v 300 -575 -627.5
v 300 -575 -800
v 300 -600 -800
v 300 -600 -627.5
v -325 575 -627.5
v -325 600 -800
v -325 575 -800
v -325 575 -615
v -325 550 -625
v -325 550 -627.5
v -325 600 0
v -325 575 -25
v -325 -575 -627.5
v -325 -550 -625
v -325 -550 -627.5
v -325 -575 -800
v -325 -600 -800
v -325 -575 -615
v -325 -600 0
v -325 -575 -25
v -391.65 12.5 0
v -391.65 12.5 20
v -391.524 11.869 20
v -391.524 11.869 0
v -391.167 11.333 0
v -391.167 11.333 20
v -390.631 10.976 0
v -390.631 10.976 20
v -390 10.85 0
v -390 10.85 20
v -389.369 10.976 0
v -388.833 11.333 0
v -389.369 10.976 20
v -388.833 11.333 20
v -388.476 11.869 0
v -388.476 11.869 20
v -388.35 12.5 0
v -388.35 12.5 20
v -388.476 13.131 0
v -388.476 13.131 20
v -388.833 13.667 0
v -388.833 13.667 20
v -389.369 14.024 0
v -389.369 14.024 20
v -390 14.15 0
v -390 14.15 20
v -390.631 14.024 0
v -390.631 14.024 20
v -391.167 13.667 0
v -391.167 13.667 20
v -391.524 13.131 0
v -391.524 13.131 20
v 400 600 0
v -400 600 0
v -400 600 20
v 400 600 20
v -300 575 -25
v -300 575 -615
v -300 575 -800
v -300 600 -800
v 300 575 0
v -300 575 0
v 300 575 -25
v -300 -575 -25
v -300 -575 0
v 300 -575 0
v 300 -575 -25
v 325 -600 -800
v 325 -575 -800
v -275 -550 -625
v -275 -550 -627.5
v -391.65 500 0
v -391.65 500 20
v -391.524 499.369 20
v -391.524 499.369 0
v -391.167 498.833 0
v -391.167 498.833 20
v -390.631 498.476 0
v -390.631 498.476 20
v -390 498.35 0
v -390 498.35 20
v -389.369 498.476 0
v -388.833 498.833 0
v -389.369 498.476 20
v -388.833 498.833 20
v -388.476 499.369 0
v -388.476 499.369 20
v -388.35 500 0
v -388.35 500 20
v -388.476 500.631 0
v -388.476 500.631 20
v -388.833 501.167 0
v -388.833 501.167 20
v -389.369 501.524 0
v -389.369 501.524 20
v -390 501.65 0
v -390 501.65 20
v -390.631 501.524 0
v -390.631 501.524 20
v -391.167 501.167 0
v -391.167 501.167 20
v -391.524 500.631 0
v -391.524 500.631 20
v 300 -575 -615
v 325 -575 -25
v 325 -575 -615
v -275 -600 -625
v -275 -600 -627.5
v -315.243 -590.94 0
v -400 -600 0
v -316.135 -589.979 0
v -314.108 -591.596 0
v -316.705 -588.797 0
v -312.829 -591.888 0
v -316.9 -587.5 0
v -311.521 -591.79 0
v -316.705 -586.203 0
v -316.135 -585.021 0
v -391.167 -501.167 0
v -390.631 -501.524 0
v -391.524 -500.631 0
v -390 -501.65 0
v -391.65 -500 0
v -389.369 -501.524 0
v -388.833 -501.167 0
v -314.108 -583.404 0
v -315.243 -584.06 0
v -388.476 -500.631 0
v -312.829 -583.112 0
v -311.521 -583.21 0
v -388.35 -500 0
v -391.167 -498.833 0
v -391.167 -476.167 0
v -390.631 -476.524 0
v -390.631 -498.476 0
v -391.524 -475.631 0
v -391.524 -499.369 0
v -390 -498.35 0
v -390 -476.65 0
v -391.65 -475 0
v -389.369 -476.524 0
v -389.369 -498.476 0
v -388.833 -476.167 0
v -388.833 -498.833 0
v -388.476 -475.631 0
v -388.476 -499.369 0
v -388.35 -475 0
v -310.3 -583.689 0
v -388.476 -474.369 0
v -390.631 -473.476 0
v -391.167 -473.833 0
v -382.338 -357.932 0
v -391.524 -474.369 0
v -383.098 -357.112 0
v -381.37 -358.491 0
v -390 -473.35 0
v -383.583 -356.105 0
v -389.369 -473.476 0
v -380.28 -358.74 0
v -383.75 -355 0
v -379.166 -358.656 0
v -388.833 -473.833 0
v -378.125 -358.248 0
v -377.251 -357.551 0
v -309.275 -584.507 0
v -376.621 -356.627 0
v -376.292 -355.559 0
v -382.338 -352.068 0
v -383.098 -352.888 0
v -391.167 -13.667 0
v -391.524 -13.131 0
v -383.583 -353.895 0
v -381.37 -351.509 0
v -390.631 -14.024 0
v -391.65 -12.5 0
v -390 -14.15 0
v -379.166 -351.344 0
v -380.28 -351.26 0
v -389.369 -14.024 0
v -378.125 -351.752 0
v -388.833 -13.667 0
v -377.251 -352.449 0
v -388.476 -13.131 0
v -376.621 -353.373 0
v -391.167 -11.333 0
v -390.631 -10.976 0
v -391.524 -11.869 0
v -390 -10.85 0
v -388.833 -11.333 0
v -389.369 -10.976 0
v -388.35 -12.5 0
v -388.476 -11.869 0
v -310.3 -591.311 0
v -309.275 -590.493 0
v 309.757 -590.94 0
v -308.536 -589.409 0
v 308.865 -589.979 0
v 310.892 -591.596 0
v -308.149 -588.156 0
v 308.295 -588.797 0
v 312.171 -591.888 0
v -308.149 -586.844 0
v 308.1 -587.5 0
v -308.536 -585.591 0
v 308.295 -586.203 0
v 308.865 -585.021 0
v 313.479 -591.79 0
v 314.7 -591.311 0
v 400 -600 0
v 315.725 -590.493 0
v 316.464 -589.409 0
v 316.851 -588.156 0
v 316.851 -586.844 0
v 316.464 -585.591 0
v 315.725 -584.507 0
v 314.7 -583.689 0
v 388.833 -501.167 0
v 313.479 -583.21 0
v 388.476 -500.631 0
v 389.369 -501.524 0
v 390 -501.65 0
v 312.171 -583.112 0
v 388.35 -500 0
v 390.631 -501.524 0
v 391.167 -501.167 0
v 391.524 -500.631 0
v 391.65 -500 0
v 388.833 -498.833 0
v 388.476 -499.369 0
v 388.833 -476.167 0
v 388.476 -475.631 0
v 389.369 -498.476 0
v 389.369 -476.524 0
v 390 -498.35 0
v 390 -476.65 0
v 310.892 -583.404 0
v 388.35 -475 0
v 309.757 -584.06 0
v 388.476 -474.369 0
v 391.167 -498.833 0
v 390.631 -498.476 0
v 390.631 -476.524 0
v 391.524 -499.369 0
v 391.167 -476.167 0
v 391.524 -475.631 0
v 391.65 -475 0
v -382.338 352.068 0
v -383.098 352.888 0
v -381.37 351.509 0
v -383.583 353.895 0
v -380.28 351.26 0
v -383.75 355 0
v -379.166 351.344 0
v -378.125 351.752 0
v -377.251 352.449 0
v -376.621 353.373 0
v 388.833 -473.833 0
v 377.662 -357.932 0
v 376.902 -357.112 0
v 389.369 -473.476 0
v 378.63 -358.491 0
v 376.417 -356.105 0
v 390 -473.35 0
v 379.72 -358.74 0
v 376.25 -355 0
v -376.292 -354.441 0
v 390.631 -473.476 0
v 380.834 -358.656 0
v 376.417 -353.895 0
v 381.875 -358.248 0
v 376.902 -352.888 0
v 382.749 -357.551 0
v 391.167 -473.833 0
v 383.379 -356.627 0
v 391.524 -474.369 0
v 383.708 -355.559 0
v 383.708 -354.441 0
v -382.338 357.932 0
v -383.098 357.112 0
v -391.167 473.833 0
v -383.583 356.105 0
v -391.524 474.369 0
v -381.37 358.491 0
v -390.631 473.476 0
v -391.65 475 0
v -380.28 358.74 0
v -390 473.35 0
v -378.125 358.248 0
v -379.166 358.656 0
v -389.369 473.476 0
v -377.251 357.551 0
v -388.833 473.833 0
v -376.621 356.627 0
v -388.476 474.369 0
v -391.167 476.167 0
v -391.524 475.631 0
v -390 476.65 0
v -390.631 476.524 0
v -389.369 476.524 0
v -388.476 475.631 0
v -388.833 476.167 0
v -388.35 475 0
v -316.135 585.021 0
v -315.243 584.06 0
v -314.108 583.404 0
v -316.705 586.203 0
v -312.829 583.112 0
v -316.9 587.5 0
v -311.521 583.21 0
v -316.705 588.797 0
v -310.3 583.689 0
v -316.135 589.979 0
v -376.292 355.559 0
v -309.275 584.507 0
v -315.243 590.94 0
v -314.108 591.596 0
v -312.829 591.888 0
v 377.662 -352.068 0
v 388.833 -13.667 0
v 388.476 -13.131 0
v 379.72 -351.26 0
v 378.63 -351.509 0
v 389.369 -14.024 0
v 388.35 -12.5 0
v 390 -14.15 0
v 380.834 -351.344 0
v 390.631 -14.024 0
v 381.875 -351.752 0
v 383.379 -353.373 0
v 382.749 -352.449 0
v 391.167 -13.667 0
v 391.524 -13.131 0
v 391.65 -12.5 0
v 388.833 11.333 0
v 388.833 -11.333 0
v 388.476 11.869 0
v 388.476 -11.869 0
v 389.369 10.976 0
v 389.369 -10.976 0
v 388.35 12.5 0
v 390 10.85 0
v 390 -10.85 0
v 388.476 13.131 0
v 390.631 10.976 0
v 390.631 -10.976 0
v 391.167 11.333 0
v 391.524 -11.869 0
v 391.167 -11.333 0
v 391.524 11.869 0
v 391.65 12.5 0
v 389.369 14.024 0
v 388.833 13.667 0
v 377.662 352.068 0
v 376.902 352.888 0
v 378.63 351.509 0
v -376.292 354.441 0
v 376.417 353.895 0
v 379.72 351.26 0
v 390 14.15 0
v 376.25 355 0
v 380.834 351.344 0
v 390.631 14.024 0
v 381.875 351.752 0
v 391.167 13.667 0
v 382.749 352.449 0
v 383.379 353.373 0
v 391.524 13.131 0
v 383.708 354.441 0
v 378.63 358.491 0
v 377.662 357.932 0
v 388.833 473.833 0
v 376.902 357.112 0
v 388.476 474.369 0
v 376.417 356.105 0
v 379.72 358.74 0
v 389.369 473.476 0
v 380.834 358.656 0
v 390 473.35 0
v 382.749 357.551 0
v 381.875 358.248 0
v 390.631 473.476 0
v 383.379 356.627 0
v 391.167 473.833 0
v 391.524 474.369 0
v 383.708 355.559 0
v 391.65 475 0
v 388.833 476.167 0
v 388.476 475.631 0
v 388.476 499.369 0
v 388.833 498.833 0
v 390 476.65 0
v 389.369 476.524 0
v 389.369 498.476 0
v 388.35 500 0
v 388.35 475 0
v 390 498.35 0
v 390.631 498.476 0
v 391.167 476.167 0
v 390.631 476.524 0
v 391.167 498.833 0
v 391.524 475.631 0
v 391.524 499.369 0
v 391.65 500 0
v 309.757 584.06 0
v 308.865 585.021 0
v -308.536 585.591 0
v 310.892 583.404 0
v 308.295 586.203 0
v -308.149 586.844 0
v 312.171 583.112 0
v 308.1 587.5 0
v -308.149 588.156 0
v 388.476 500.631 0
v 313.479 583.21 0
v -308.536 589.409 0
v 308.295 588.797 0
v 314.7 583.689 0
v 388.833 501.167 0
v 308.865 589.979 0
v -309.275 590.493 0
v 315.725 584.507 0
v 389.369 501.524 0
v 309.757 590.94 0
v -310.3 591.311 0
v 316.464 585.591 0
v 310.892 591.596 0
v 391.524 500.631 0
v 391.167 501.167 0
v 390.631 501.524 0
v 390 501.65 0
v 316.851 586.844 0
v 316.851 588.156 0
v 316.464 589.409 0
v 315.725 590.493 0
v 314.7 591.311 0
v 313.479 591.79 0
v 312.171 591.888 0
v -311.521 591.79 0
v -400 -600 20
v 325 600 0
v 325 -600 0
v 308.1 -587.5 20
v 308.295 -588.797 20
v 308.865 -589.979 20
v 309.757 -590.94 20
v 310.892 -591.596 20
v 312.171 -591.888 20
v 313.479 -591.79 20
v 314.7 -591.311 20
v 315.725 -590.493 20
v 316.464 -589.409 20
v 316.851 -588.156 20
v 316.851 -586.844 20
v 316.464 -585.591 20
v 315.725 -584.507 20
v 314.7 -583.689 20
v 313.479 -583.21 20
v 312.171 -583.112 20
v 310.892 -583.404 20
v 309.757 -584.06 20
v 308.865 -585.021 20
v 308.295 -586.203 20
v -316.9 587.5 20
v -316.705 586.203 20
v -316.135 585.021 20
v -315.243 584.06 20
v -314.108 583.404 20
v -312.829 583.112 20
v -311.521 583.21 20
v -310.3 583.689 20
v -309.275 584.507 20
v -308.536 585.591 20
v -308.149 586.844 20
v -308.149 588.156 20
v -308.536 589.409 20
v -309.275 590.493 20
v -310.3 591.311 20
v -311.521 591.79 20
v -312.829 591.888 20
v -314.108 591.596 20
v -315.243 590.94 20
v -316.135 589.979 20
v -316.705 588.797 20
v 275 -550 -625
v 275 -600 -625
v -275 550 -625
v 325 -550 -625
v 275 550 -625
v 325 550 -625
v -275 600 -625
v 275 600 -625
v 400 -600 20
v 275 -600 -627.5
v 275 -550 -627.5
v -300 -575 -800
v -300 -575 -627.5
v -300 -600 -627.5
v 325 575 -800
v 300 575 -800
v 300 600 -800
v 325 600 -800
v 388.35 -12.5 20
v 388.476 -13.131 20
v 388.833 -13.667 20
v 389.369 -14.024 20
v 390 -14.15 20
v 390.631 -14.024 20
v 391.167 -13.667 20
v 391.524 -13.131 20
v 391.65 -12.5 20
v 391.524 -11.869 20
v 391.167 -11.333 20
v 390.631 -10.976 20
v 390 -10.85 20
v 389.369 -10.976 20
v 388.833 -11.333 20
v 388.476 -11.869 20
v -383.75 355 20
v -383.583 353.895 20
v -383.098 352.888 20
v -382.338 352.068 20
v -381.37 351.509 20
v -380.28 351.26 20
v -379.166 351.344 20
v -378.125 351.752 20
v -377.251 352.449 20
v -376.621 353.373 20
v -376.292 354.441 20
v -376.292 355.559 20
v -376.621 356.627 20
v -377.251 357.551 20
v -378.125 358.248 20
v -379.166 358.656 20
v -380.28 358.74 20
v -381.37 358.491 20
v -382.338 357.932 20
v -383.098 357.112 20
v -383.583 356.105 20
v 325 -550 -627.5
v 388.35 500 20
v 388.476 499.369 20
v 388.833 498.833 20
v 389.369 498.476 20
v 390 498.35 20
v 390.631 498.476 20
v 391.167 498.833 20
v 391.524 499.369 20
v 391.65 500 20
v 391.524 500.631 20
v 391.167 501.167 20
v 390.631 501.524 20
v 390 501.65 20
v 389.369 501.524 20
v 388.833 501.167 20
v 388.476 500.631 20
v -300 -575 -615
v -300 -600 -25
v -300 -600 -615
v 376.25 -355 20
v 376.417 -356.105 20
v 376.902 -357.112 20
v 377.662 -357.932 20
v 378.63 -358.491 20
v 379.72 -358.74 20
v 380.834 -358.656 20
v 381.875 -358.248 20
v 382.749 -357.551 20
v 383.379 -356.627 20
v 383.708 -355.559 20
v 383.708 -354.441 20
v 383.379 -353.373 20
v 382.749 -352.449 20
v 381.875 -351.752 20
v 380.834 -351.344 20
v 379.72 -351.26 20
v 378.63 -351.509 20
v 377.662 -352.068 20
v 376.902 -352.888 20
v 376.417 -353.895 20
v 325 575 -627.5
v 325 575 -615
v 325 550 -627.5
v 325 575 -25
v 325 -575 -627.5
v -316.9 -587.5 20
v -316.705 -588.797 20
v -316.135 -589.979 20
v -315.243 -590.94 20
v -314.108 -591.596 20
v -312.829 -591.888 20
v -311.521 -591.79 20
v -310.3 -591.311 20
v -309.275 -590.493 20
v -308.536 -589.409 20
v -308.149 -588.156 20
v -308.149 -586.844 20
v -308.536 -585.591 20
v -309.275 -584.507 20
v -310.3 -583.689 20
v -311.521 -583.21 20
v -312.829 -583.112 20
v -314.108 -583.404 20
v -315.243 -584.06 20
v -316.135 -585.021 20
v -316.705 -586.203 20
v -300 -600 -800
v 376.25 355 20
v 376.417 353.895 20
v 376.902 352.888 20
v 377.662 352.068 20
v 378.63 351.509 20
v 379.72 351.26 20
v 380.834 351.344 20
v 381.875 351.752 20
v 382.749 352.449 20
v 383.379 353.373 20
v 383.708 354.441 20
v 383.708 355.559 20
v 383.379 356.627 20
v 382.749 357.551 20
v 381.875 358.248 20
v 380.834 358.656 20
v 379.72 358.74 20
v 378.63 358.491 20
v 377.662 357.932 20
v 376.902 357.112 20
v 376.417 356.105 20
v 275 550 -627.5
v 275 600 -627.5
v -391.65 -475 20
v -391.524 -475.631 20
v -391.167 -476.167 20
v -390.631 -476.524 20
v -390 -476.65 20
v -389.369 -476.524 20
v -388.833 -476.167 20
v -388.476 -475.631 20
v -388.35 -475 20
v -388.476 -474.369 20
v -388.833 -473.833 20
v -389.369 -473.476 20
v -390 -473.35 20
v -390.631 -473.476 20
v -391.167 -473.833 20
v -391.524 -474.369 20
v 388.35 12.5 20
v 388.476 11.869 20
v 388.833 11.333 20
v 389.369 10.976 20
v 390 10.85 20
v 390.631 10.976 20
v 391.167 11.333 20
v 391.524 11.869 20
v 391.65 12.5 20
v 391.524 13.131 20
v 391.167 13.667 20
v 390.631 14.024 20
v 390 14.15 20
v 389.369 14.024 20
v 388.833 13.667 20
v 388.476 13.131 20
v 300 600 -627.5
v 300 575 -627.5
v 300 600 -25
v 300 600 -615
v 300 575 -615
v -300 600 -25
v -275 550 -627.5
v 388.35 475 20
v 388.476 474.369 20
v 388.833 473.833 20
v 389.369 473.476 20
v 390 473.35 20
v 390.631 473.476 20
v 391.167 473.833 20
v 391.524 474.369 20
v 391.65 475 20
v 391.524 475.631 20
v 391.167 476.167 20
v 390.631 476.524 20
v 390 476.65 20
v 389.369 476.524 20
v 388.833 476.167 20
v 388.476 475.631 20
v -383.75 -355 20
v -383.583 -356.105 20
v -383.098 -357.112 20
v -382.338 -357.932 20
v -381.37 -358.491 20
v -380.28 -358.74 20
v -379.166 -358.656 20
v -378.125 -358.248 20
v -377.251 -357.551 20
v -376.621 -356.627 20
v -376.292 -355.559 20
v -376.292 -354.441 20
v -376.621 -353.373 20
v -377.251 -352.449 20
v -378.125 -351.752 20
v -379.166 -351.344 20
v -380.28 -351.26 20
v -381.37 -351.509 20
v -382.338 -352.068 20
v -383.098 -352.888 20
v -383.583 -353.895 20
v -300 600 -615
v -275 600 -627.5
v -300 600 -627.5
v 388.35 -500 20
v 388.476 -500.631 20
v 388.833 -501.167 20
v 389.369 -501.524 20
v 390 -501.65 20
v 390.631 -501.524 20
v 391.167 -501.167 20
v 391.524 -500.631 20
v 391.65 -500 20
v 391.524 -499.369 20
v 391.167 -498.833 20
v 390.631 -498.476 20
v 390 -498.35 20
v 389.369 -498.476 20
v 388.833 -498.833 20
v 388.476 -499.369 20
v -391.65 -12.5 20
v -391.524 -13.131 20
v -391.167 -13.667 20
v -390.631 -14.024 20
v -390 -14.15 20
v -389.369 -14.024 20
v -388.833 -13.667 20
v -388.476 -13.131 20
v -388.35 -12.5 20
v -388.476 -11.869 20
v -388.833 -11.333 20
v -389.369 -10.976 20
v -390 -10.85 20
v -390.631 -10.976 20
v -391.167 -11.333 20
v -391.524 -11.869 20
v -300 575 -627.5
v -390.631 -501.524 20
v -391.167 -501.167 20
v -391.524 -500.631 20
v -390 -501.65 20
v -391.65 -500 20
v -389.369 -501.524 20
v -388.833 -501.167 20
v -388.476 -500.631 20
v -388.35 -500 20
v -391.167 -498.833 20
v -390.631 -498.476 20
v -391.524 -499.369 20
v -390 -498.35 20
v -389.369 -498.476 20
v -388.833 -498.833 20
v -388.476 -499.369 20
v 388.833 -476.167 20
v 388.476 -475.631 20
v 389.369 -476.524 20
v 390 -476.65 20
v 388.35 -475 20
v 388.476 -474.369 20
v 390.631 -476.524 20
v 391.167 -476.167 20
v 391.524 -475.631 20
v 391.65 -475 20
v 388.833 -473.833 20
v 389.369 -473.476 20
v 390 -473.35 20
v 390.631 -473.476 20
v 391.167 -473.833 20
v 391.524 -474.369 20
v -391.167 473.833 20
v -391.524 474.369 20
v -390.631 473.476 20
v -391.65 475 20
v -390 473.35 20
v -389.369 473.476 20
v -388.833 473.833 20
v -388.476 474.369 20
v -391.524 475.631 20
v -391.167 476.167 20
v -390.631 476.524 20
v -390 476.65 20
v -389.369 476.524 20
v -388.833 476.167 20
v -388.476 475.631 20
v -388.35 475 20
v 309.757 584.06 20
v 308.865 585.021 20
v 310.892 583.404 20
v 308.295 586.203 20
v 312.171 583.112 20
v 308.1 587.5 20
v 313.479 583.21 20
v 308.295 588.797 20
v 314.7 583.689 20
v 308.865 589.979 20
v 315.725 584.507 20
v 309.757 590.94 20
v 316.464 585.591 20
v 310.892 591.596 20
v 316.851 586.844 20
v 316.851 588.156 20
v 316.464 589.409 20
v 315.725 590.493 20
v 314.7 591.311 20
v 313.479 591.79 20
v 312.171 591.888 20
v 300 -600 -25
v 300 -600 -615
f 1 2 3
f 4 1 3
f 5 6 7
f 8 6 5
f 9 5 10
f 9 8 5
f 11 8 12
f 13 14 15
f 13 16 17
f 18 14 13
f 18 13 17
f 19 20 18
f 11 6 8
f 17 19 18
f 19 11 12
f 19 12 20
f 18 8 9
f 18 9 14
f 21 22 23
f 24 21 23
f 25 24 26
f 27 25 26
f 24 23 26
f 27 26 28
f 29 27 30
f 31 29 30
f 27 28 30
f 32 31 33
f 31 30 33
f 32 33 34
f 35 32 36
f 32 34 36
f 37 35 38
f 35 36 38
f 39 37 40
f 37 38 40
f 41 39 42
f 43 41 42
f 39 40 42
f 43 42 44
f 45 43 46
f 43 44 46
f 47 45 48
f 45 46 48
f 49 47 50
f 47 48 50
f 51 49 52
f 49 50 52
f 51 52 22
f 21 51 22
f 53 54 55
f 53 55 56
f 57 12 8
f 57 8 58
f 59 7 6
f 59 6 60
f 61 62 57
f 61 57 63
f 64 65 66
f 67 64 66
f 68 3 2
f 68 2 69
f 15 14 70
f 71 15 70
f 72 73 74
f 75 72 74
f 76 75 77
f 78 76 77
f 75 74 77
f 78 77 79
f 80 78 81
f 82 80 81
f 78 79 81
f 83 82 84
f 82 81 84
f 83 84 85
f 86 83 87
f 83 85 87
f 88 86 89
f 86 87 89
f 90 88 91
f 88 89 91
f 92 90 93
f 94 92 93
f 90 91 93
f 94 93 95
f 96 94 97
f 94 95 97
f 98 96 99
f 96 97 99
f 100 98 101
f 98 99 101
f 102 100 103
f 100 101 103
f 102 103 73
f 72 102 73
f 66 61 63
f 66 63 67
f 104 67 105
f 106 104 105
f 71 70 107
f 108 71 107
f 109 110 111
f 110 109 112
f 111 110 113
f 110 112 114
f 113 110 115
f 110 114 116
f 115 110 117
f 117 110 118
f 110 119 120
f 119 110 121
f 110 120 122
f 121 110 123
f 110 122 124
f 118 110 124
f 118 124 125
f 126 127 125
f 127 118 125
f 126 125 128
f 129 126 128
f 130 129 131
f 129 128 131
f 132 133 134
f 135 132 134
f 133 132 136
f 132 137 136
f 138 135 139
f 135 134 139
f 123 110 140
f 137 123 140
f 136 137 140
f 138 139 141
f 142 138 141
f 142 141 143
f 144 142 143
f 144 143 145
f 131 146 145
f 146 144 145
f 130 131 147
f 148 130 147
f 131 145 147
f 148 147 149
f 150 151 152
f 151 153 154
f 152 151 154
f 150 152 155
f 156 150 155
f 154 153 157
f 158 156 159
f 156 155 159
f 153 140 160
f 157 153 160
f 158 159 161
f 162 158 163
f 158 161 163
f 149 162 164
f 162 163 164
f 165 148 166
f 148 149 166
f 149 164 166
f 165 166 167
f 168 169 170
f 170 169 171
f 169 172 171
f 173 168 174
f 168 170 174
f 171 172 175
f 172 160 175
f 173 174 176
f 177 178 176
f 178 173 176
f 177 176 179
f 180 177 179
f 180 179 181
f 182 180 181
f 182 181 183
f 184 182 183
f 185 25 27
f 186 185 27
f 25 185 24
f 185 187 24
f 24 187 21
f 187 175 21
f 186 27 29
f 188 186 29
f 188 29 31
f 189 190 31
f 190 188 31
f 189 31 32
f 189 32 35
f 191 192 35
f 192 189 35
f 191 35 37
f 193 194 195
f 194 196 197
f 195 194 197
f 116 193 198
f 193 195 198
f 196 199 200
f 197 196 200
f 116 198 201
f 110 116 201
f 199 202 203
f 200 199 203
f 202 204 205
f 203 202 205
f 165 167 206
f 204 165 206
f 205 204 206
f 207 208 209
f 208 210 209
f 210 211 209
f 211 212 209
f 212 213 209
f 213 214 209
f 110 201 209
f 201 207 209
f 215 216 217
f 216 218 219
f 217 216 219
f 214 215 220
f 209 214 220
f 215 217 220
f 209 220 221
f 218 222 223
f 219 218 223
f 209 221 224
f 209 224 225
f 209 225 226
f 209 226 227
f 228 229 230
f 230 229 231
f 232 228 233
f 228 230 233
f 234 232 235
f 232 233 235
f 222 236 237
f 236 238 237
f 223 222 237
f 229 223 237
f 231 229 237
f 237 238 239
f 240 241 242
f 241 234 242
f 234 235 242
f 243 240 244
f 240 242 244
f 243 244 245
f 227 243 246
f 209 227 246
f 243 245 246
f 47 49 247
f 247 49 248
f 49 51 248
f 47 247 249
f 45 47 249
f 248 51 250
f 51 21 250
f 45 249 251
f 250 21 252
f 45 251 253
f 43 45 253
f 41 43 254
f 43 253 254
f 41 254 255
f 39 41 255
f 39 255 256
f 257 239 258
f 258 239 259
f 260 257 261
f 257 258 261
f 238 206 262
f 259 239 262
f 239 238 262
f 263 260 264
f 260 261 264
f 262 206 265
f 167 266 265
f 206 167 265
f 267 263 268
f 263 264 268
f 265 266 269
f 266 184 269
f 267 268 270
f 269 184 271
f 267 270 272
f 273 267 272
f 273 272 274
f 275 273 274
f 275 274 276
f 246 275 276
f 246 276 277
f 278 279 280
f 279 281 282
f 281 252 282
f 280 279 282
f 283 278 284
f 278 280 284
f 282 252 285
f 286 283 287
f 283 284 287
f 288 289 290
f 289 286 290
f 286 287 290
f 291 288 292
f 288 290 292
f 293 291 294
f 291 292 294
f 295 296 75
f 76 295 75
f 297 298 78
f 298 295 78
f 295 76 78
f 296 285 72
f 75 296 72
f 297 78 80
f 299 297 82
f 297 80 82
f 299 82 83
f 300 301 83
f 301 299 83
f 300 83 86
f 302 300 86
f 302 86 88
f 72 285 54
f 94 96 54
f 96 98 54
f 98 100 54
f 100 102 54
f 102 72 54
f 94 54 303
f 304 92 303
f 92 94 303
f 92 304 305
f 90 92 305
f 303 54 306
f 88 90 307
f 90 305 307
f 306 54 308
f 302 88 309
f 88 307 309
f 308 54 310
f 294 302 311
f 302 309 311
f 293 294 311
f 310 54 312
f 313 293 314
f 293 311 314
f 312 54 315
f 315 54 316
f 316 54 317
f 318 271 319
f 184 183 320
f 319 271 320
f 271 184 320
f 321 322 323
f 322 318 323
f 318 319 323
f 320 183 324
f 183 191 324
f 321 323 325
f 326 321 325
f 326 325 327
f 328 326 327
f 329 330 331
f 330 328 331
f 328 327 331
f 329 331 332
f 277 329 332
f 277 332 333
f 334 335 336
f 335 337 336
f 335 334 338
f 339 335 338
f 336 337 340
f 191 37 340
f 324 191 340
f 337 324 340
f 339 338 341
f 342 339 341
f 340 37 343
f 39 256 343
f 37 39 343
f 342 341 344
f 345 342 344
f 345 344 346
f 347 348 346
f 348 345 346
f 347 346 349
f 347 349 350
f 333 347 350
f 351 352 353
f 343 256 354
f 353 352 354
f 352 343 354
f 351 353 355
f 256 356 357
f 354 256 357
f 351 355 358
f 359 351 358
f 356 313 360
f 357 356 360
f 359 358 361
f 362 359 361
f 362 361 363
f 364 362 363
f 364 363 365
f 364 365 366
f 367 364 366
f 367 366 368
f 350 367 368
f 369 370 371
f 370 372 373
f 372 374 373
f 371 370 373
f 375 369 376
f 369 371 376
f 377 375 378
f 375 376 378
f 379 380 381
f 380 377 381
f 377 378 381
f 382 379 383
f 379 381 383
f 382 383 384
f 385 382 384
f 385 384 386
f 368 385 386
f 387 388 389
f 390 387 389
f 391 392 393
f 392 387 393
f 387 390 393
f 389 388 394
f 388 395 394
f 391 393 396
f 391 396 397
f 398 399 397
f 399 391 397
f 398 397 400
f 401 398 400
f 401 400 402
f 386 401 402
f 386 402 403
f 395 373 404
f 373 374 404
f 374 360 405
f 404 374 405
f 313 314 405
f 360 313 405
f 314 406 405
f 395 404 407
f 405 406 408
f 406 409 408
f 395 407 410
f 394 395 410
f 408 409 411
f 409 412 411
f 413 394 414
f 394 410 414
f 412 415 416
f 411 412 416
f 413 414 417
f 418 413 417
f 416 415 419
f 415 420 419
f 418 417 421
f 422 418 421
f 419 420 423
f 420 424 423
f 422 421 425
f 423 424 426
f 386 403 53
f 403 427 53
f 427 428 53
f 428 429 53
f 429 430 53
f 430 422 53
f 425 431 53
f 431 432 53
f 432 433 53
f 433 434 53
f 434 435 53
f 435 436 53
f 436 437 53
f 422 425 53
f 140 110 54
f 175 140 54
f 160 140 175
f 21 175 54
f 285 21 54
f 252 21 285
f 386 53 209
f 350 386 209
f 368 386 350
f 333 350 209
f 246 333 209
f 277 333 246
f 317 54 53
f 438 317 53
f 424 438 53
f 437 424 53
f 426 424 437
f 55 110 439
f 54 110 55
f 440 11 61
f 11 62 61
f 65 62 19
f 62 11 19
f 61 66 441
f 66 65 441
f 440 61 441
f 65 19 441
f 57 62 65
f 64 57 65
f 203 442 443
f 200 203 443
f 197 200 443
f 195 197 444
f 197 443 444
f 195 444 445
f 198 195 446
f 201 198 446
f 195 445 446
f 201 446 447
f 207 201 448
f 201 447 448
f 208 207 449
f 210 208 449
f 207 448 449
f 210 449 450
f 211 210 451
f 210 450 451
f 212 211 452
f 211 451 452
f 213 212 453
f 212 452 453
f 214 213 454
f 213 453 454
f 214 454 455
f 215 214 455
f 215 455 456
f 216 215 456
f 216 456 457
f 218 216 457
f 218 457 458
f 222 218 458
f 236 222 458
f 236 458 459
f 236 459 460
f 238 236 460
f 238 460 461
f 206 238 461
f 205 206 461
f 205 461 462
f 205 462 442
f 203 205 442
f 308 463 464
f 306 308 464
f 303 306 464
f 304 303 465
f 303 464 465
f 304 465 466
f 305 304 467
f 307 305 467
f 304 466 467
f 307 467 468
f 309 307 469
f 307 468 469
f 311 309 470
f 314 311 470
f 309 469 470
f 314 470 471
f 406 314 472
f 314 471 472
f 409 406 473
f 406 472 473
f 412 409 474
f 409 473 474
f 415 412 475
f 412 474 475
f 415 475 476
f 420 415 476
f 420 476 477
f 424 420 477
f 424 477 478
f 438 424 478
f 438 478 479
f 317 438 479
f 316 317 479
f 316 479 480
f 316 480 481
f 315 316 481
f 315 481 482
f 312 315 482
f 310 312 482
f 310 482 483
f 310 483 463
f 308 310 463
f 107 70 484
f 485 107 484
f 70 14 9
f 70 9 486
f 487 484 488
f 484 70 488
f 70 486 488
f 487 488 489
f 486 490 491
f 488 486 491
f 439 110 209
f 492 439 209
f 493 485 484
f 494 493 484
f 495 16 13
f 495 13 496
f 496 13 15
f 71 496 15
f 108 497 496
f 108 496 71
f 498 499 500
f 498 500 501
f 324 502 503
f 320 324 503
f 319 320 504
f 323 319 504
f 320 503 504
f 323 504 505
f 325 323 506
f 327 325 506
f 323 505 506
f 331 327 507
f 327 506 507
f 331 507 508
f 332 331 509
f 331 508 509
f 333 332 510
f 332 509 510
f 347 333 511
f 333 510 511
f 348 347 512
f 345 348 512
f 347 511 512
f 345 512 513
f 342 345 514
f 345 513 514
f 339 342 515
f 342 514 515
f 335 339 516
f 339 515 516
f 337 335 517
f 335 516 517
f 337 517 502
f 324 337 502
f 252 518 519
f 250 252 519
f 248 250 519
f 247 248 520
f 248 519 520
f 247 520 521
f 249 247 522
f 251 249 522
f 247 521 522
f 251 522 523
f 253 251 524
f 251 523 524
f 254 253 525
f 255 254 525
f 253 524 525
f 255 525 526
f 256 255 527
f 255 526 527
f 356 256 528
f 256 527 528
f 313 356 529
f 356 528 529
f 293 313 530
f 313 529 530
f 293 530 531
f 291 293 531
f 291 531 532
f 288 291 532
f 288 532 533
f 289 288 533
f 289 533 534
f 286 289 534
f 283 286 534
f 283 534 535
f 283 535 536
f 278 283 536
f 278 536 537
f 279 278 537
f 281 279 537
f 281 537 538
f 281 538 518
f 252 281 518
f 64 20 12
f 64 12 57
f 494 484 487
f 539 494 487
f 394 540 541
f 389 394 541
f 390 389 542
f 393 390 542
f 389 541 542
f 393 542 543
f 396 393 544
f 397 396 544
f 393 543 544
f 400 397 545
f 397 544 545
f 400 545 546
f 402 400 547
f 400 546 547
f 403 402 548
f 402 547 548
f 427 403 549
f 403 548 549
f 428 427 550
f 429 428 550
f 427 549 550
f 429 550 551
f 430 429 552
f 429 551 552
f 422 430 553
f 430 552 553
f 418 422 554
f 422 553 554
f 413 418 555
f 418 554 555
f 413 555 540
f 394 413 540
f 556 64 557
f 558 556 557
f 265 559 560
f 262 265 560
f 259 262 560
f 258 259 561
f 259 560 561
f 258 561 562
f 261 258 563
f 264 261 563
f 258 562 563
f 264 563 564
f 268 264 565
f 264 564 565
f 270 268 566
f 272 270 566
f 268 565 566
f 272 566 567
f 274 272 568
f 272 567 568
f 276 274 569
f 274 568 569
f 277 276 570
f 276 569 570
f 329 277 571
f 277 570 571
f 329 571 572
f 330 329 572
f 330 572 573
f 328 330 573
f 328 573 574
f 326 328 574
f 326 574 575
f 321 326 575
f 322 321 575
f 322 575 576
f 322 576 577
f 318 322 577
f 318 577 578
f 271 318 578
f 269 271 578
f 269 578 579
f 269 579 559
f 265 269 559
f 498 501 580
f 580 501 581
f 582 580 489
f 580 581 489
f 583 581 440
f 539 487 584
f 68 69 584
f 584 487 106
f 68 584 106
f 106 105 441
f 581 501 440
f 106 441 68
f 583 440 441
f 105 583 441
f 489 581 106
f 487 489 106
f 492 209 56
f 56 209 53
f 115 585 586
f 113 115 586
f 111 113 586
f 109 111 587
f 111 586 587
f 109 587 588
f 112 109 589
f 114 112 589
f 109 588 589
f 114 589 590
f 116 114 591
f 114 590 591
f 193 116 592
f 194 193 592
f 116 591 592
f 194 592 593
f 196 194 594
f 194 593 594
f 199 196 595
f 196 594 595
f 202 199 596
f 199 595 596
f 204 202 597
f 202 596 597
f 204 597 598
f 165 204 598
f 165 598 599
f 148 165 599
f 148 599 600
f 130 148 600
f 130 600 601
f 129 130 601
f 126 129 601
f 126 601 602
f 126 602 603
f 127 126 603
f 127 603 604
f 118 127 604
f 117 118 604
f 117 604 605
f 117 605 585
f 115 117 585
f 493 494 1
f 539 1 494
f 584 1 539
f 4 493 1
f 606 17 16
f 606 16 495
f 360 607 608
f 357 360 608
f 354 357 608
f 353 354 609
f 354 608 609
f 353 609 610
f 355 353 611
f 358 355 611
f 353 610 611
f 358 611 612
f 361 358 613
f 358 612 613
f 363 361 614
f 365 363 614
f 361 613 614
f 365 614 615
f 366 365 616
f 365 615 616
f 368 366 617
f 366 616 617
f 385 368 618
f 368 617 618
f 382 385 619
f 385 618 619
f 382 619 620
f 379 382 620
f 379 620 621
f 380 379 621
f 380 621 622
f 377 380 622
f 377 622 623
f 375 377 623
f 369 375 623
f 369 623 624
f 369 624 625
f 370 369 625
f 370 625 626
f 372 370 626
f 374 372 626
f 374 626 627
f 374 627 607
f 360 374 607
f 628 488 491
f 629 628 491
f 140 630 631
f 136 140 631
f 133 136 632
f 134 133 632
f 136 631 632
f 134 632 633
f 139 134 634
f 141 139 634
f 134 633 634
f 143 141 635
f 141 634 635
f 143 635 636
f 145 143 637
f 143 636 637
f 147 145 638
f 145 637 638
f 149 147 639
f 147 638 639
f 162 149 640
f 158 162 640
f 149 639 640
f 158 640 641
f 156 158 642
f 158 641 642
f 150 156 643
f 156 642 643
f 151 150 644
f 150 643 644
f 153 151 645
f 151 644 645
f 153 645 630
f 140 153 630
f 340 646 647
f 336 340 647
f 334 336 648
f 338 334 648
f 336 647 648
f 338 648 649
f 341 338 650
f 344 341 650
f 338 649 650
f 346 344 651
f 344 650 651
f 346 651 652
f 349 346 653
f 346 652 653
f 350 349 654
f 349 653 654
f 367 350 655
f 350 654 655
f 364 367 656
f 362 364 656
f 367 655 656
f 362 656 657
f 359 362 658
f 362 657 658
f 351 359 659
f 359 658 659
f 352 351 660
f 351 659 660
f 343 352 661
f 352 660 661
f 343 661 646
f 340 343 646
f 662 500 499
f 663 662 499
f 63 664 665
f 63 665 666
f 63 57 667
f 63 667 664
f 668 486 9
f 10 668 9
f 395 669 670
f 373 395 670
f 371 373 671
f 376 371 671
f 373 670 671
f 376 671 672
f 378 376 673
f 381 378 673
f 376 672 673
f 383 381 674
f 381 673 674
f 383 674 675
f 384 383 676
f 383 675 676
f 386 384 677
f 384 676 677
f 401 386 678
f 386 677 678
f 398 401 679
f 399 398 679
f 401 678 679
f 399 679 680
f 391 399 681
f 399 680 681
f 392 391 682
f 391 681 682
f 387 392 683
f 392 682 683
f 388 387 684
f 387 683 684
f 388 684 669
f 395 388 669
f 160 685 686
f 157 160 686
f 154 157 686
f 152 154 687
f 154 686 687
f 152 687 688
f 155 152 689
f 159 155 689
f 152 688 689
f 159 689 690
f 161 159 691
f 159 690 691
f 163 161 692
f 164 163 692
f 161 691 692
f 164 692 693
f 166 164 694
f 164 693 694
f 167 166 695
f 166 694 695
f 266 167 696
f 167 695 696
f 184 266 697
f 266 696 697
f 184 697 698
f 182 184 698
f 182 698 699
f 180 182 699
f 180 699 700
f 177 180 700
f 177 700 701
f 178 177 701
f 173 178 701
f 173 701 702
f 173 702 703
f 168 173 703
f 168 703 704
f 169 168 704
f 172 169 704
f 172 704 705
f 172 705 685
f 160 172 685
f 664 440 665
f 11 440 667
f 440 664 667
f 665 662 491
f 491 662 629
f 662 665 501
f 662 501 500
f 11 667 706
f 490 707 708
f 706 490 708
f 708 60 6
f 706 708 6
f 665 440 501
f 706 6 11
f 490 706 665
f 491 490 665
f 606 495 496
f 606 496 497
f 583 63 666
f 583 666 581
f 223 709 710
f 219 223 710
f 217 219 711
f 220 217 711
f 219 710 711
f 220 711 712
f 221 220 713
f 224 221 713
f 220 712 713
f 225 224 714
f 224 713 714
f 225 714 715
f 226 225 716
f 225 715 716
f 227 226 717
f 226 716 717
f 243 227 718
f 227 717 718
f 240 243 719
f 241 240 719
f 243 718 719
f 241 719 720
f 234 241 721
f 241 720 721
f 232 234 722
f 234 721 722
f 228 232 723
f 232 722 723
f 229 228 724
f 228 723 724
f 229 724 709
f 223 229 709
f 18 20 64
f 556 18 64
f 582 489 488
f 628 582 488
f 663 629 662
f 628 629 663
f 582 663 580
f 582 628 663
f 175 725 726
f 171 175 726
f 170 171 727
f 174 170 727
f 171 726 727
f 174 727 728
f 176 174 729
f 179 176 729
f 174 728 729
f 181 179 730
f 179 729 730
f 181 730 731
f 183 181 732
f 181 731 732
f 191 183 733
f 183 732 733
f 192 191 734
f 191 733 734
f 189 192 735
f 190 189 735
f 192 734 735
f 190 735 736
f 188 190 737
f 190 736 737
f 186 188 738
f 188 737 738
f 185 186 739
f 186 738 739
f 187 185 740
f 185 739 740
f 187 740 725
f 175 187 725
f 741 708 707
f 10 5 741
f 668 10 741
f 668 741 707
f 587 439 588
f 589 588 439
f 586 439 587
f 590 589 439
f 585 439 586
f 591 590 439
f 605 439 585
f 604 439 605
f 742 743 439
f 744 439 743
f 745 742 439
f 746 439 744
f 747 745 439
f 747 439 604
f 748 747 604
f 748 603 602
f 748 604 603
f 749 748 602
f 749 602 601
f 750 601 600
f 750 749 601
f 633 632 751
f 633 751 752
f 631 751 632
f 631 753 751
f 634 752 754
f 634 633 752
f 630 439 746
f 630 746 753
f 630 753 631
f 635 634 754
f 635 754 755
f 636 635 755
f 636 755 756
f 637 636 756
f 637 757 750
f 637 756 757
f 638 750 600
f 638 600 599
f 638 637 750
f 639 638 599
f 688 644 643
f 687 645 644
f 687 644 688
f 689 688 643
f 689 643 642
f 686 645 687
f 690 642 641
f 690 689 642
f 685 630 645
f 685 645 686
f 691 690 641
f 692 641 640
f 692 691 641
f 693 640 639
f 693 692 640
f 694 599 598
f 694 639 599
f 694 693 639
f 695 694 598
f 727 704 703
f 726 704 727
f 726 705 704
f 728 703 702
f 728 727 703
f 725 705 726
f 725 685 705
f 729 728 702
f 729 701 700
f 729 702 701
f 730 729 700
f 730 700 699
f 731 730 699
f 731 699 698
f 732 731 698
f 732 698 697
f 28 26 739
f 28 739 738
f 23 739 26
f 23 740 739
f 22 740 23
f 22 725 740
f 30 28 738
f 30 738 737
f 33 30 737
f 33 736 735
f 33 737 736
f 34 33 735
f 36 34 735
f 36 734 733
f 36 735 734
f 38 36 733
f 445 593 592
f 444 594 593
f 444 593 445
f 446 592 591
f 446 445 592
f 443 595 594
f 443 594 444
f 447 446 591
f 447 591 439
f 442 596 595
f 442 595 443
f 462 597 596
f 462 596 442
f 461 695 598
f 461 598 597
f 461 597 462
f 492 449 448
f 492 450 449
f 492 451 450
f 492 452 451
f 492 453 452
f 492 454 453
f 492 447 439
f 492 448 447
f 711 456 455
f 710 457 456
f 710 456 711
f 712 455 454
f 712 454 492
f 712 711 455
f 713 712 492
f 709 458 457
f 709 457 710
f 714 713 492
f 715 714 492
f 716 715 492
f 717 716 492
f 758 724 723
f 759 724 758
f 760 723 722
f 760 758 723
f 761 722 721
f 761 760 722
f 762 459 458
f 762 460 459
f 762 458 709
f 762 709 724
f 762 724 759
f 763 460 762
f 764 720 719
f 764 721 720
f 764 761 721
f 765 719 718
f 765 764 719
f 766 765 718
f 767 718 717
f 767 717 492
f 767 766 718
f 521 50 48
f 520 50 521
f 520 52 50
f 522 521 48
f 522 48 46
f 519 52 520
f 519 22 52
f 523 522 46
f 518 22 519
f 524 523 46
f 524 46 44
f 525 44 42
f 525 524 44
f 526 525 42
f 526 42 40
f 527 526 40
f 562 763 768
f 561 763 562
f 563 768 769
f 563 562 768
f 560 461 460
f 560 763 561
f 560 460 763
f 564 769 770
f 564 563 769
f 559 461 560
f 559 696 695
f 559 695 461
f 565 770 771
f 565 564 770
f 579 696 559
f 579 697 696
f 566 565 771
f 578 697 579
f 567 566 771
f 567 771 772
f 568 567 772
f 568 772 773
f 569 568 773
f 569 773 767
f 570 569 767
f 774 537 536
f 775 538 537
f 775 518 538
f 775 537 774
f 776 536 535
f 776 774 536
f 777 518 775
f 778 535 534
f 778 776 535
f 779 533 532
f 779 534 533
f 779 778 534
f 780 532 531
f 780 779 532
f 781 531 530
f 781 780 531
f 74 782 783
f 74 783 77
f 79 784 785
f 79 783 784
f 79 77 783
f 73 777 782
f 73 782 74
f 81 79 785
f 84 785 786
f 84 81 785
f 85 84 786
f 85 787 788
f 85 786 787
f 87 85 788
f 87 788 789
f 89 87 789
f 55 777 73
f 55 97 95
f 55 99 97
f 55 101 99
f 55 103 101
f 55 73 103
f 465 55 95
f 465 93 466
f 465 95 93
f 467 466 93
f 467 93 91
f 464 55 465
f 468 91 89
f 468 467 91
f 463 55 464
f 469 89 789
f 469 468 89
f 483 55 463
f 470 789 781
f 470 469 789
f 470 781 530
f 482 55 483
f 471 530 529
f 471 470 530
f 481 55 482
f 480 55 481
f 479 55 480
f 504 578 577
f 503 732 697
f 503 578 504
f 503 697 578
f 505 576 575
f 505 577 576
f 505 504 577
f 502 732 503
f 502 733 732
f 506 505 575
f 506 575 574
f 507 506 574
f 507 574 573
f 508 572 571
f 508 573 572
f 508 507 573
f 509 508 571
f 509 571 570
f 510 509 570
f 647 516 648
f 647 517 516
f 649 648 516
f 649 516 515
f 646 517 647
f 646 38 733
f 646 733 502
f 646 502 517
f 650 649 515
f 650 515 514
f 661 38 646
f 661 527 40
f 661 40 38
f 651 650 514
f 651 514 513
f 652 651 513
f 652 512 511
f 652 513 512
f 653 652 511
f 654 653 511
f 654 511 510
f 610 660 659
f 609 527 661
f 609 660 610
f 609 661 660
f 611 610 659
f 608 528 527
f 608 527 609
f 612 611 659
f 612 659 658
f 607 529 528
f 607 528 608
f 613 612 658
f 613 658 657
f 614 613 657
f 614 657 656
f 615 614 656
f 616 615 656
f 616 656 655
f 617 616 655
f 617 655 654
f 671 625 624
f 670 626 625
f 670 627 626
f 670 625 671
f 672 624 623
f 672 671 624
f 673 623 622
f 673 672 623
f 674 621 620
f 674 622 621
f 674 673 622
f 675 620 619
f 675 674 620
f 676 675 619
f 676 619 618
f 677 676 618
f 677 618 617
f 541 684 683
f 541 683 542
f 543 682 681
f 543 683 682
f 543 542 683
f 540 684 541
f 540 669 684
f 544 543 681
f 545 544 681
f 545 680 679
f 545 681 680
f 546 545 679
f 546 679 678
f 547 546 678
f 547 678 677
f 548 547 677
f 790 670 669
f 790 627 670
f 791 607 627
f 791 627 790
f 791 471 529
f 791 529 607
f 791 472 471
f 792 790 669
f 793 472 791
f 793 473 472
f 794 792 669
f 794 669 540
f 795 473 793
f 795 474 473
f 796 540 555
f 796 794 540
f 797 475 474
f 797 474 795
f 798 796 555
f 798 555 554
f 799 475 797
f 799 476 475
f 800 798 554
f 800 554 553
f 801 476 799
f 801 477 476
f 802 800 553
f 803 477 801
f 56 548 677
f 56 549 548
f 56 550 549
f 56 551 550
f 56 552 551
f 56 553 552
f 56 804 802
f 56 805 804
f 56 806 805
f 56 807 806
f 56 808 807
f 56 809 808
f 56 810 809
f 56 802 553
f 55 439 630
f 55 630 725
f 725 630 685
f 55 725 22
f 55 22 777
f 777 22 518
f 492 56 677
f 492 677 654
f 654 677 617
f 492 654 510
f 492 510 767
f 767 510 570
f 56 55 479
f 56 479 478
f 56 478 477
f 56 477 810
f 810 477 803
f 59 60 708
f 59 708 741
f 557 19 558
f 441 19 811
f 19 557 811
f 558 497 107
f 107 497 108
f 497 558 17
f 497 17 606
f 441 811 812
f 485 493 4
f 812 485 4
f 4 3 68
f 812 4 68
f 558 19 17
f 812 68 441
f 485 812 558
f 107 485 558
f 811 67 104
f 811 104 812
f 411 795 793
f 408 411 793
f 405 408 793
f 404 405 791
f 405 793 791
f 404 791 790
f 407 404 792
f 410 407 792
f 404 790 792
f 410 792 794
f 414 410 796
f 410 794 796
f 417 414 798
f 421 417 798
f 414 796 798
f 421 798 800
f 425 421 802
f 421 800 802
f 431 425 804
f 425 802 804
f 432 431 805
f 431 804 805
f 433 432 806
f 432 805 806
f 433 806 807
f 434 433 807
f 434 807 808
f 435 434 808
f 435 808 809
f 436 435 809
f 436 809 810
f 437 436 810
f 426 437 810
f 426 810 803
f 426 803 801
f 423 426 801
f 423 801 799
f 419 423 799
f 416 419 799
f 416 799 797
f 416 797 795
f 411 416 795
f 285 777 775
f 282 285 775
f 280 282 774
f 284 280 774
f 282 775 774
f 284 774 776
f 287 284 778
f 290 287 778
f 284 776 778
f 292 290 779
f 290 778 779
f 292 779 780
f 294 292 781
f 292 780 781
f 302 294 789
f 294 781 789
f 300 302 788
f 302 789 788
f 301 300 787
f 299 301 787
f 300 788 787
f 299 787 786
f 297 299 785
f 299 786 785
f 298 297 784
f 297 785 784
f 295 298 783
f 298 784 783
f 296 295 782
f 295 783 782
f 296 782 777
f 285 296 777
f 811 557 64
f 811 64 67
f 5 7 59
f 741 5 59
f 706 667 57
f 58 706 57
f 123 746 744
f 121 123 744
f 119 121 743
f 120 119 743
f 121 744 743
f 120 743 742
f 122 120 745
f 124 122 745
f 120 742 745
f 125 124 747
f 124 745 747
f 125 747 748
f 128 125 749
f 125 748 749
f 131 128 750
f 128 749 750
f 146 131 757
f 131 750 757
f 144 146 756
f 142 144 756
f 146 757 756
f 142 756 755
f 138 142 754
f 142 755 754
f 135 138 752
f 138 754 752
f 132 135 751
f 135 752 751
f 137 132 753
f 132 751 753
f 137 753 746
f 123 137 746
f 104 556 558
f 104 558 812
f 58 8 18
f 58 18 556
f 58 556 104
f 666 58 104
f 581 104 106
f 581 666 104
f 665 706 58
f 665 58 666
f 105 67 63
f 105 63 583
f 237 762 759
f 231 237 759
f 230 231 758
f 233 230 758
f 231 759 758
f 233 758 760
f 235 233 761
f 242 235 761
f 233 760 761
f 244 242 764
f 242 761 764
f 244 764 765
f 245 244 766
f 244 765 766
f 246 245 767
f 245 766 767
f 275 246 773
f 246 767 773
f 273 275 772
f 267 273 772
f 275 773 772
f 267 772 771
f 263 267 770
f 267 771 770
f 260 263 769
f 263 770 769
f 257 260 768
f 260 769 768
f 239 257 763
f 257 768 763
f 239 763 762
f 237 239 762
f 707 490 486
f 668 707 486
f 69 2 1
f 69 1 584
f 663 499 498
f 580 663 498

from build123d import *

# Parameters (mm, degrees)
F0_W      = 800
F0_H      = 1200
F1_DEPTH  = 20
F2_W      = 25
F2_H      = 25
F3_DEPTH  = 800
F4_W      = 600
F4_H      = 25
F5_DEPTH  = 25
F4_W_2    = 25
F4_H_2    = 1150
F7_D      = 3.3
F9_D      = 7.5
F10_D     = 8.8
F14_DEPTH = 2.5
F16_DEPTH = 10


with BuildPart() as f1:
    # F0 (on Top) → F1 (new body)
    with BuildSketch(Plane.XY):
        Rectangle(F0_W, F0_H)
    extrude(amount=F1_DEPTH)

    # F7 (through all)
    with Locations(Plane(origin=(0, 0, 0), x_dir=(1, 0, 0), z_dir=(0, 0, -1))):
        with Locations((390, 500), (390, 475), (390, 12.5), (390, -12.5), (390, -500), (390, -475), (-390, -500), (-390, -475), (-390, -12.5), (-390, 12.5), (-390, 475), (-390, 500)):
            Hole(F7_D / 2)

    # F9 (through all)
    with Locations(Plane(origin=(0, 0, 0), x_dir=(1, 0, 0), z_dir=(0, 0, -1))):
        with Locations((380, 355), (380, -355), (-380, -355), (-380, 355)):
            Hole(F9_D / 2)

    # F10 (through all)
    with Locations(Plane(origin=(0, 0, 0), x_dir=(1, 0, 0), z_dir=(0, 0, -1))):
        with Locations((-312.5, 587.5), (312.5, 587.5), (312.5, -587.5), (-312.5, -587.5)):
            Hole(F10_D / 2)


with BuildPart() as f3:
    # F2 (on face) → F3 (new body)
    with BuildSketch(Plane(origin=(0, 0, 0), x_dir=(1, 0, 0), z_dir=(0, 0, -1))):
        with Locations((-312.5, 587.5)):
            Rectangle(F2_W, F2_H)
    extrude(amount=F3_DEPTH)


with BuildPart() as f3b:
    # F2 (on face) → F3, piece 2 (new body)
    with BuildSketch(Plane(origin=(0, 0, 0), x_dir=(1, 0, 0), z_dir=(0, 0, -1))):
        with Locations((312.5, 587.5)):
            Rectangle(F2_W, F2_H)
    extrude(amount=F3_DEPTH)


with BuildPart() as f3c:
    # F2 (on face) → F3, piece 3 (new body)
    with BuildSketch(Plane(origin=(0, 0, 0), x_dir=(1, 0, 0), z_dir=(0, 0, -1))):
        with Locations((-312.5, -587.5)):
            Rectangle(F2_W, F2_H)
    extrude(amount=F3_DEPTH)


with BuildPart() as f3d:
    # F2 (on face) → F3, piece 4 (new body)
    with BuildSketch(Plane(origin=(0, 0, 0), x_dir=(1, 0, 0), z_dir=(0, 0, -1))):
        with Locations((312.5, -587.5)):
            Rectangle(F2_W, F2_H)
    extrude(amount=F3_DEPTH)


with BuildPart() as f5:
    # F4 (on face) → F5 (new body)
    with BuildSketch(Plane(origin=(0, 0, 0), x_dir=(1, 0, 0), z_dir=(0, 0, -1))):
        with Locations((0, -587.5)):
            Rectangle(F4_W, F4_H)
    extrude(amount=F5_DEPTH)


with BuildPart() as f5b:
    # F4 (on face) → F5, piece 2 (new body)
    with BuildSketch(Plane(origin=(0, 0, 0), x_dir=(1, 0, 0), z_dir=(0, 0, -1))):
        with Locations((-312.5, 0)):
            Rectangle(F4_W_2, F4_H_2)
    extrude(amount=F5_DEPTH)


with BuildPart() as f5c:
    # F4 (on face) → F5, piece 3 (new body)
    with BuildSketch(Plane(origin=(0, 0, 0), x_dir=(1, 0, 0), z_dir=(0, 0, -1))):
        with Locations((312.5, 0)):
            Rectangle(F4_W_2, F4_H_2)
    extrude(amount=F5_DEPTH)


with BuildPart() as f5d:
    # F4 (on face) → F5, piece 4 (new body)
    with BuildSketch(Plane(origin=(0, 0, 0), x_dir=(1, 0, 0), z_dir=(0, 0, -1))):
        with Locations((0, 587.5)):
            Rectangle(F4_W, F4_H)
    extrude(amount=F5_DEPTH)


with BuildPart() as f3_1:
    add(f3.part)

    # F8: union F3b, F3c, F3d, F5d, F5b, F5, F5c
    add(f3b.part)
    add(f3c.part)
    add(f3d.part)
    add(f5d.part)
    add(f5b.part)
    add(f5.part)
    add(f5c.part)

    # F13 (on offset) → F14 (join)
    with BuildSketch(Plane(origin=(0, 0, -625), x_dir=(1, 0, 0), z_dir=(0, 0, -1))):
        Polygon((325, 575), (300, 575), (300, 600), (275, 600), (275, 550), (325, 550), align=None)
        Polygon((-325, -575), (-300, -575), (-300, -600), (-275, -600), (-275, -550), (-325, -550), align=None)
        Polygon((300, -600), (300, -575), (325, -575), (325, -550), (275, -550), (275, -600), align=None)
        Polygon((-300, 600), (-300, 575), (-325, 575), (-325, 550), (-275, 550), (-275, 600), align=None)
    extrude(amount=F14_DEPTH)

    # F15 (on face) → F16 (join)
    with BuildSketch(Plane.XY.offset(-625)):
        Polygon((-275, -600), (275, -600), (275, -550), (325, -550), (325, 550), (275, 550), (275, 600), (-275, 600), (-275, 550), (-325, 550), (-325, -550), (-275, -550), align=None)
        Polygon((275, 550), (325, 550), (325, 575), (300, 575), (300, 600), (275, 600), align=None)
        Polygon((-325, 575), (-325, 550), (-275, 550), (-275, 600), (-300, 600), (-300, 575), align=None)
        Polygon((-300, -600), (-275, -600), (-275, -550), (-325, -550), (-325, -575), (-300, -575), align=None)
        Polygon((275, -550), (275, -600), (300, -600), (300, -575), (325, -575), (325, -550), align=None)
    extrude(amount=F16_DEPTH)


solid = Compound([f1.part, f3_1.part])
